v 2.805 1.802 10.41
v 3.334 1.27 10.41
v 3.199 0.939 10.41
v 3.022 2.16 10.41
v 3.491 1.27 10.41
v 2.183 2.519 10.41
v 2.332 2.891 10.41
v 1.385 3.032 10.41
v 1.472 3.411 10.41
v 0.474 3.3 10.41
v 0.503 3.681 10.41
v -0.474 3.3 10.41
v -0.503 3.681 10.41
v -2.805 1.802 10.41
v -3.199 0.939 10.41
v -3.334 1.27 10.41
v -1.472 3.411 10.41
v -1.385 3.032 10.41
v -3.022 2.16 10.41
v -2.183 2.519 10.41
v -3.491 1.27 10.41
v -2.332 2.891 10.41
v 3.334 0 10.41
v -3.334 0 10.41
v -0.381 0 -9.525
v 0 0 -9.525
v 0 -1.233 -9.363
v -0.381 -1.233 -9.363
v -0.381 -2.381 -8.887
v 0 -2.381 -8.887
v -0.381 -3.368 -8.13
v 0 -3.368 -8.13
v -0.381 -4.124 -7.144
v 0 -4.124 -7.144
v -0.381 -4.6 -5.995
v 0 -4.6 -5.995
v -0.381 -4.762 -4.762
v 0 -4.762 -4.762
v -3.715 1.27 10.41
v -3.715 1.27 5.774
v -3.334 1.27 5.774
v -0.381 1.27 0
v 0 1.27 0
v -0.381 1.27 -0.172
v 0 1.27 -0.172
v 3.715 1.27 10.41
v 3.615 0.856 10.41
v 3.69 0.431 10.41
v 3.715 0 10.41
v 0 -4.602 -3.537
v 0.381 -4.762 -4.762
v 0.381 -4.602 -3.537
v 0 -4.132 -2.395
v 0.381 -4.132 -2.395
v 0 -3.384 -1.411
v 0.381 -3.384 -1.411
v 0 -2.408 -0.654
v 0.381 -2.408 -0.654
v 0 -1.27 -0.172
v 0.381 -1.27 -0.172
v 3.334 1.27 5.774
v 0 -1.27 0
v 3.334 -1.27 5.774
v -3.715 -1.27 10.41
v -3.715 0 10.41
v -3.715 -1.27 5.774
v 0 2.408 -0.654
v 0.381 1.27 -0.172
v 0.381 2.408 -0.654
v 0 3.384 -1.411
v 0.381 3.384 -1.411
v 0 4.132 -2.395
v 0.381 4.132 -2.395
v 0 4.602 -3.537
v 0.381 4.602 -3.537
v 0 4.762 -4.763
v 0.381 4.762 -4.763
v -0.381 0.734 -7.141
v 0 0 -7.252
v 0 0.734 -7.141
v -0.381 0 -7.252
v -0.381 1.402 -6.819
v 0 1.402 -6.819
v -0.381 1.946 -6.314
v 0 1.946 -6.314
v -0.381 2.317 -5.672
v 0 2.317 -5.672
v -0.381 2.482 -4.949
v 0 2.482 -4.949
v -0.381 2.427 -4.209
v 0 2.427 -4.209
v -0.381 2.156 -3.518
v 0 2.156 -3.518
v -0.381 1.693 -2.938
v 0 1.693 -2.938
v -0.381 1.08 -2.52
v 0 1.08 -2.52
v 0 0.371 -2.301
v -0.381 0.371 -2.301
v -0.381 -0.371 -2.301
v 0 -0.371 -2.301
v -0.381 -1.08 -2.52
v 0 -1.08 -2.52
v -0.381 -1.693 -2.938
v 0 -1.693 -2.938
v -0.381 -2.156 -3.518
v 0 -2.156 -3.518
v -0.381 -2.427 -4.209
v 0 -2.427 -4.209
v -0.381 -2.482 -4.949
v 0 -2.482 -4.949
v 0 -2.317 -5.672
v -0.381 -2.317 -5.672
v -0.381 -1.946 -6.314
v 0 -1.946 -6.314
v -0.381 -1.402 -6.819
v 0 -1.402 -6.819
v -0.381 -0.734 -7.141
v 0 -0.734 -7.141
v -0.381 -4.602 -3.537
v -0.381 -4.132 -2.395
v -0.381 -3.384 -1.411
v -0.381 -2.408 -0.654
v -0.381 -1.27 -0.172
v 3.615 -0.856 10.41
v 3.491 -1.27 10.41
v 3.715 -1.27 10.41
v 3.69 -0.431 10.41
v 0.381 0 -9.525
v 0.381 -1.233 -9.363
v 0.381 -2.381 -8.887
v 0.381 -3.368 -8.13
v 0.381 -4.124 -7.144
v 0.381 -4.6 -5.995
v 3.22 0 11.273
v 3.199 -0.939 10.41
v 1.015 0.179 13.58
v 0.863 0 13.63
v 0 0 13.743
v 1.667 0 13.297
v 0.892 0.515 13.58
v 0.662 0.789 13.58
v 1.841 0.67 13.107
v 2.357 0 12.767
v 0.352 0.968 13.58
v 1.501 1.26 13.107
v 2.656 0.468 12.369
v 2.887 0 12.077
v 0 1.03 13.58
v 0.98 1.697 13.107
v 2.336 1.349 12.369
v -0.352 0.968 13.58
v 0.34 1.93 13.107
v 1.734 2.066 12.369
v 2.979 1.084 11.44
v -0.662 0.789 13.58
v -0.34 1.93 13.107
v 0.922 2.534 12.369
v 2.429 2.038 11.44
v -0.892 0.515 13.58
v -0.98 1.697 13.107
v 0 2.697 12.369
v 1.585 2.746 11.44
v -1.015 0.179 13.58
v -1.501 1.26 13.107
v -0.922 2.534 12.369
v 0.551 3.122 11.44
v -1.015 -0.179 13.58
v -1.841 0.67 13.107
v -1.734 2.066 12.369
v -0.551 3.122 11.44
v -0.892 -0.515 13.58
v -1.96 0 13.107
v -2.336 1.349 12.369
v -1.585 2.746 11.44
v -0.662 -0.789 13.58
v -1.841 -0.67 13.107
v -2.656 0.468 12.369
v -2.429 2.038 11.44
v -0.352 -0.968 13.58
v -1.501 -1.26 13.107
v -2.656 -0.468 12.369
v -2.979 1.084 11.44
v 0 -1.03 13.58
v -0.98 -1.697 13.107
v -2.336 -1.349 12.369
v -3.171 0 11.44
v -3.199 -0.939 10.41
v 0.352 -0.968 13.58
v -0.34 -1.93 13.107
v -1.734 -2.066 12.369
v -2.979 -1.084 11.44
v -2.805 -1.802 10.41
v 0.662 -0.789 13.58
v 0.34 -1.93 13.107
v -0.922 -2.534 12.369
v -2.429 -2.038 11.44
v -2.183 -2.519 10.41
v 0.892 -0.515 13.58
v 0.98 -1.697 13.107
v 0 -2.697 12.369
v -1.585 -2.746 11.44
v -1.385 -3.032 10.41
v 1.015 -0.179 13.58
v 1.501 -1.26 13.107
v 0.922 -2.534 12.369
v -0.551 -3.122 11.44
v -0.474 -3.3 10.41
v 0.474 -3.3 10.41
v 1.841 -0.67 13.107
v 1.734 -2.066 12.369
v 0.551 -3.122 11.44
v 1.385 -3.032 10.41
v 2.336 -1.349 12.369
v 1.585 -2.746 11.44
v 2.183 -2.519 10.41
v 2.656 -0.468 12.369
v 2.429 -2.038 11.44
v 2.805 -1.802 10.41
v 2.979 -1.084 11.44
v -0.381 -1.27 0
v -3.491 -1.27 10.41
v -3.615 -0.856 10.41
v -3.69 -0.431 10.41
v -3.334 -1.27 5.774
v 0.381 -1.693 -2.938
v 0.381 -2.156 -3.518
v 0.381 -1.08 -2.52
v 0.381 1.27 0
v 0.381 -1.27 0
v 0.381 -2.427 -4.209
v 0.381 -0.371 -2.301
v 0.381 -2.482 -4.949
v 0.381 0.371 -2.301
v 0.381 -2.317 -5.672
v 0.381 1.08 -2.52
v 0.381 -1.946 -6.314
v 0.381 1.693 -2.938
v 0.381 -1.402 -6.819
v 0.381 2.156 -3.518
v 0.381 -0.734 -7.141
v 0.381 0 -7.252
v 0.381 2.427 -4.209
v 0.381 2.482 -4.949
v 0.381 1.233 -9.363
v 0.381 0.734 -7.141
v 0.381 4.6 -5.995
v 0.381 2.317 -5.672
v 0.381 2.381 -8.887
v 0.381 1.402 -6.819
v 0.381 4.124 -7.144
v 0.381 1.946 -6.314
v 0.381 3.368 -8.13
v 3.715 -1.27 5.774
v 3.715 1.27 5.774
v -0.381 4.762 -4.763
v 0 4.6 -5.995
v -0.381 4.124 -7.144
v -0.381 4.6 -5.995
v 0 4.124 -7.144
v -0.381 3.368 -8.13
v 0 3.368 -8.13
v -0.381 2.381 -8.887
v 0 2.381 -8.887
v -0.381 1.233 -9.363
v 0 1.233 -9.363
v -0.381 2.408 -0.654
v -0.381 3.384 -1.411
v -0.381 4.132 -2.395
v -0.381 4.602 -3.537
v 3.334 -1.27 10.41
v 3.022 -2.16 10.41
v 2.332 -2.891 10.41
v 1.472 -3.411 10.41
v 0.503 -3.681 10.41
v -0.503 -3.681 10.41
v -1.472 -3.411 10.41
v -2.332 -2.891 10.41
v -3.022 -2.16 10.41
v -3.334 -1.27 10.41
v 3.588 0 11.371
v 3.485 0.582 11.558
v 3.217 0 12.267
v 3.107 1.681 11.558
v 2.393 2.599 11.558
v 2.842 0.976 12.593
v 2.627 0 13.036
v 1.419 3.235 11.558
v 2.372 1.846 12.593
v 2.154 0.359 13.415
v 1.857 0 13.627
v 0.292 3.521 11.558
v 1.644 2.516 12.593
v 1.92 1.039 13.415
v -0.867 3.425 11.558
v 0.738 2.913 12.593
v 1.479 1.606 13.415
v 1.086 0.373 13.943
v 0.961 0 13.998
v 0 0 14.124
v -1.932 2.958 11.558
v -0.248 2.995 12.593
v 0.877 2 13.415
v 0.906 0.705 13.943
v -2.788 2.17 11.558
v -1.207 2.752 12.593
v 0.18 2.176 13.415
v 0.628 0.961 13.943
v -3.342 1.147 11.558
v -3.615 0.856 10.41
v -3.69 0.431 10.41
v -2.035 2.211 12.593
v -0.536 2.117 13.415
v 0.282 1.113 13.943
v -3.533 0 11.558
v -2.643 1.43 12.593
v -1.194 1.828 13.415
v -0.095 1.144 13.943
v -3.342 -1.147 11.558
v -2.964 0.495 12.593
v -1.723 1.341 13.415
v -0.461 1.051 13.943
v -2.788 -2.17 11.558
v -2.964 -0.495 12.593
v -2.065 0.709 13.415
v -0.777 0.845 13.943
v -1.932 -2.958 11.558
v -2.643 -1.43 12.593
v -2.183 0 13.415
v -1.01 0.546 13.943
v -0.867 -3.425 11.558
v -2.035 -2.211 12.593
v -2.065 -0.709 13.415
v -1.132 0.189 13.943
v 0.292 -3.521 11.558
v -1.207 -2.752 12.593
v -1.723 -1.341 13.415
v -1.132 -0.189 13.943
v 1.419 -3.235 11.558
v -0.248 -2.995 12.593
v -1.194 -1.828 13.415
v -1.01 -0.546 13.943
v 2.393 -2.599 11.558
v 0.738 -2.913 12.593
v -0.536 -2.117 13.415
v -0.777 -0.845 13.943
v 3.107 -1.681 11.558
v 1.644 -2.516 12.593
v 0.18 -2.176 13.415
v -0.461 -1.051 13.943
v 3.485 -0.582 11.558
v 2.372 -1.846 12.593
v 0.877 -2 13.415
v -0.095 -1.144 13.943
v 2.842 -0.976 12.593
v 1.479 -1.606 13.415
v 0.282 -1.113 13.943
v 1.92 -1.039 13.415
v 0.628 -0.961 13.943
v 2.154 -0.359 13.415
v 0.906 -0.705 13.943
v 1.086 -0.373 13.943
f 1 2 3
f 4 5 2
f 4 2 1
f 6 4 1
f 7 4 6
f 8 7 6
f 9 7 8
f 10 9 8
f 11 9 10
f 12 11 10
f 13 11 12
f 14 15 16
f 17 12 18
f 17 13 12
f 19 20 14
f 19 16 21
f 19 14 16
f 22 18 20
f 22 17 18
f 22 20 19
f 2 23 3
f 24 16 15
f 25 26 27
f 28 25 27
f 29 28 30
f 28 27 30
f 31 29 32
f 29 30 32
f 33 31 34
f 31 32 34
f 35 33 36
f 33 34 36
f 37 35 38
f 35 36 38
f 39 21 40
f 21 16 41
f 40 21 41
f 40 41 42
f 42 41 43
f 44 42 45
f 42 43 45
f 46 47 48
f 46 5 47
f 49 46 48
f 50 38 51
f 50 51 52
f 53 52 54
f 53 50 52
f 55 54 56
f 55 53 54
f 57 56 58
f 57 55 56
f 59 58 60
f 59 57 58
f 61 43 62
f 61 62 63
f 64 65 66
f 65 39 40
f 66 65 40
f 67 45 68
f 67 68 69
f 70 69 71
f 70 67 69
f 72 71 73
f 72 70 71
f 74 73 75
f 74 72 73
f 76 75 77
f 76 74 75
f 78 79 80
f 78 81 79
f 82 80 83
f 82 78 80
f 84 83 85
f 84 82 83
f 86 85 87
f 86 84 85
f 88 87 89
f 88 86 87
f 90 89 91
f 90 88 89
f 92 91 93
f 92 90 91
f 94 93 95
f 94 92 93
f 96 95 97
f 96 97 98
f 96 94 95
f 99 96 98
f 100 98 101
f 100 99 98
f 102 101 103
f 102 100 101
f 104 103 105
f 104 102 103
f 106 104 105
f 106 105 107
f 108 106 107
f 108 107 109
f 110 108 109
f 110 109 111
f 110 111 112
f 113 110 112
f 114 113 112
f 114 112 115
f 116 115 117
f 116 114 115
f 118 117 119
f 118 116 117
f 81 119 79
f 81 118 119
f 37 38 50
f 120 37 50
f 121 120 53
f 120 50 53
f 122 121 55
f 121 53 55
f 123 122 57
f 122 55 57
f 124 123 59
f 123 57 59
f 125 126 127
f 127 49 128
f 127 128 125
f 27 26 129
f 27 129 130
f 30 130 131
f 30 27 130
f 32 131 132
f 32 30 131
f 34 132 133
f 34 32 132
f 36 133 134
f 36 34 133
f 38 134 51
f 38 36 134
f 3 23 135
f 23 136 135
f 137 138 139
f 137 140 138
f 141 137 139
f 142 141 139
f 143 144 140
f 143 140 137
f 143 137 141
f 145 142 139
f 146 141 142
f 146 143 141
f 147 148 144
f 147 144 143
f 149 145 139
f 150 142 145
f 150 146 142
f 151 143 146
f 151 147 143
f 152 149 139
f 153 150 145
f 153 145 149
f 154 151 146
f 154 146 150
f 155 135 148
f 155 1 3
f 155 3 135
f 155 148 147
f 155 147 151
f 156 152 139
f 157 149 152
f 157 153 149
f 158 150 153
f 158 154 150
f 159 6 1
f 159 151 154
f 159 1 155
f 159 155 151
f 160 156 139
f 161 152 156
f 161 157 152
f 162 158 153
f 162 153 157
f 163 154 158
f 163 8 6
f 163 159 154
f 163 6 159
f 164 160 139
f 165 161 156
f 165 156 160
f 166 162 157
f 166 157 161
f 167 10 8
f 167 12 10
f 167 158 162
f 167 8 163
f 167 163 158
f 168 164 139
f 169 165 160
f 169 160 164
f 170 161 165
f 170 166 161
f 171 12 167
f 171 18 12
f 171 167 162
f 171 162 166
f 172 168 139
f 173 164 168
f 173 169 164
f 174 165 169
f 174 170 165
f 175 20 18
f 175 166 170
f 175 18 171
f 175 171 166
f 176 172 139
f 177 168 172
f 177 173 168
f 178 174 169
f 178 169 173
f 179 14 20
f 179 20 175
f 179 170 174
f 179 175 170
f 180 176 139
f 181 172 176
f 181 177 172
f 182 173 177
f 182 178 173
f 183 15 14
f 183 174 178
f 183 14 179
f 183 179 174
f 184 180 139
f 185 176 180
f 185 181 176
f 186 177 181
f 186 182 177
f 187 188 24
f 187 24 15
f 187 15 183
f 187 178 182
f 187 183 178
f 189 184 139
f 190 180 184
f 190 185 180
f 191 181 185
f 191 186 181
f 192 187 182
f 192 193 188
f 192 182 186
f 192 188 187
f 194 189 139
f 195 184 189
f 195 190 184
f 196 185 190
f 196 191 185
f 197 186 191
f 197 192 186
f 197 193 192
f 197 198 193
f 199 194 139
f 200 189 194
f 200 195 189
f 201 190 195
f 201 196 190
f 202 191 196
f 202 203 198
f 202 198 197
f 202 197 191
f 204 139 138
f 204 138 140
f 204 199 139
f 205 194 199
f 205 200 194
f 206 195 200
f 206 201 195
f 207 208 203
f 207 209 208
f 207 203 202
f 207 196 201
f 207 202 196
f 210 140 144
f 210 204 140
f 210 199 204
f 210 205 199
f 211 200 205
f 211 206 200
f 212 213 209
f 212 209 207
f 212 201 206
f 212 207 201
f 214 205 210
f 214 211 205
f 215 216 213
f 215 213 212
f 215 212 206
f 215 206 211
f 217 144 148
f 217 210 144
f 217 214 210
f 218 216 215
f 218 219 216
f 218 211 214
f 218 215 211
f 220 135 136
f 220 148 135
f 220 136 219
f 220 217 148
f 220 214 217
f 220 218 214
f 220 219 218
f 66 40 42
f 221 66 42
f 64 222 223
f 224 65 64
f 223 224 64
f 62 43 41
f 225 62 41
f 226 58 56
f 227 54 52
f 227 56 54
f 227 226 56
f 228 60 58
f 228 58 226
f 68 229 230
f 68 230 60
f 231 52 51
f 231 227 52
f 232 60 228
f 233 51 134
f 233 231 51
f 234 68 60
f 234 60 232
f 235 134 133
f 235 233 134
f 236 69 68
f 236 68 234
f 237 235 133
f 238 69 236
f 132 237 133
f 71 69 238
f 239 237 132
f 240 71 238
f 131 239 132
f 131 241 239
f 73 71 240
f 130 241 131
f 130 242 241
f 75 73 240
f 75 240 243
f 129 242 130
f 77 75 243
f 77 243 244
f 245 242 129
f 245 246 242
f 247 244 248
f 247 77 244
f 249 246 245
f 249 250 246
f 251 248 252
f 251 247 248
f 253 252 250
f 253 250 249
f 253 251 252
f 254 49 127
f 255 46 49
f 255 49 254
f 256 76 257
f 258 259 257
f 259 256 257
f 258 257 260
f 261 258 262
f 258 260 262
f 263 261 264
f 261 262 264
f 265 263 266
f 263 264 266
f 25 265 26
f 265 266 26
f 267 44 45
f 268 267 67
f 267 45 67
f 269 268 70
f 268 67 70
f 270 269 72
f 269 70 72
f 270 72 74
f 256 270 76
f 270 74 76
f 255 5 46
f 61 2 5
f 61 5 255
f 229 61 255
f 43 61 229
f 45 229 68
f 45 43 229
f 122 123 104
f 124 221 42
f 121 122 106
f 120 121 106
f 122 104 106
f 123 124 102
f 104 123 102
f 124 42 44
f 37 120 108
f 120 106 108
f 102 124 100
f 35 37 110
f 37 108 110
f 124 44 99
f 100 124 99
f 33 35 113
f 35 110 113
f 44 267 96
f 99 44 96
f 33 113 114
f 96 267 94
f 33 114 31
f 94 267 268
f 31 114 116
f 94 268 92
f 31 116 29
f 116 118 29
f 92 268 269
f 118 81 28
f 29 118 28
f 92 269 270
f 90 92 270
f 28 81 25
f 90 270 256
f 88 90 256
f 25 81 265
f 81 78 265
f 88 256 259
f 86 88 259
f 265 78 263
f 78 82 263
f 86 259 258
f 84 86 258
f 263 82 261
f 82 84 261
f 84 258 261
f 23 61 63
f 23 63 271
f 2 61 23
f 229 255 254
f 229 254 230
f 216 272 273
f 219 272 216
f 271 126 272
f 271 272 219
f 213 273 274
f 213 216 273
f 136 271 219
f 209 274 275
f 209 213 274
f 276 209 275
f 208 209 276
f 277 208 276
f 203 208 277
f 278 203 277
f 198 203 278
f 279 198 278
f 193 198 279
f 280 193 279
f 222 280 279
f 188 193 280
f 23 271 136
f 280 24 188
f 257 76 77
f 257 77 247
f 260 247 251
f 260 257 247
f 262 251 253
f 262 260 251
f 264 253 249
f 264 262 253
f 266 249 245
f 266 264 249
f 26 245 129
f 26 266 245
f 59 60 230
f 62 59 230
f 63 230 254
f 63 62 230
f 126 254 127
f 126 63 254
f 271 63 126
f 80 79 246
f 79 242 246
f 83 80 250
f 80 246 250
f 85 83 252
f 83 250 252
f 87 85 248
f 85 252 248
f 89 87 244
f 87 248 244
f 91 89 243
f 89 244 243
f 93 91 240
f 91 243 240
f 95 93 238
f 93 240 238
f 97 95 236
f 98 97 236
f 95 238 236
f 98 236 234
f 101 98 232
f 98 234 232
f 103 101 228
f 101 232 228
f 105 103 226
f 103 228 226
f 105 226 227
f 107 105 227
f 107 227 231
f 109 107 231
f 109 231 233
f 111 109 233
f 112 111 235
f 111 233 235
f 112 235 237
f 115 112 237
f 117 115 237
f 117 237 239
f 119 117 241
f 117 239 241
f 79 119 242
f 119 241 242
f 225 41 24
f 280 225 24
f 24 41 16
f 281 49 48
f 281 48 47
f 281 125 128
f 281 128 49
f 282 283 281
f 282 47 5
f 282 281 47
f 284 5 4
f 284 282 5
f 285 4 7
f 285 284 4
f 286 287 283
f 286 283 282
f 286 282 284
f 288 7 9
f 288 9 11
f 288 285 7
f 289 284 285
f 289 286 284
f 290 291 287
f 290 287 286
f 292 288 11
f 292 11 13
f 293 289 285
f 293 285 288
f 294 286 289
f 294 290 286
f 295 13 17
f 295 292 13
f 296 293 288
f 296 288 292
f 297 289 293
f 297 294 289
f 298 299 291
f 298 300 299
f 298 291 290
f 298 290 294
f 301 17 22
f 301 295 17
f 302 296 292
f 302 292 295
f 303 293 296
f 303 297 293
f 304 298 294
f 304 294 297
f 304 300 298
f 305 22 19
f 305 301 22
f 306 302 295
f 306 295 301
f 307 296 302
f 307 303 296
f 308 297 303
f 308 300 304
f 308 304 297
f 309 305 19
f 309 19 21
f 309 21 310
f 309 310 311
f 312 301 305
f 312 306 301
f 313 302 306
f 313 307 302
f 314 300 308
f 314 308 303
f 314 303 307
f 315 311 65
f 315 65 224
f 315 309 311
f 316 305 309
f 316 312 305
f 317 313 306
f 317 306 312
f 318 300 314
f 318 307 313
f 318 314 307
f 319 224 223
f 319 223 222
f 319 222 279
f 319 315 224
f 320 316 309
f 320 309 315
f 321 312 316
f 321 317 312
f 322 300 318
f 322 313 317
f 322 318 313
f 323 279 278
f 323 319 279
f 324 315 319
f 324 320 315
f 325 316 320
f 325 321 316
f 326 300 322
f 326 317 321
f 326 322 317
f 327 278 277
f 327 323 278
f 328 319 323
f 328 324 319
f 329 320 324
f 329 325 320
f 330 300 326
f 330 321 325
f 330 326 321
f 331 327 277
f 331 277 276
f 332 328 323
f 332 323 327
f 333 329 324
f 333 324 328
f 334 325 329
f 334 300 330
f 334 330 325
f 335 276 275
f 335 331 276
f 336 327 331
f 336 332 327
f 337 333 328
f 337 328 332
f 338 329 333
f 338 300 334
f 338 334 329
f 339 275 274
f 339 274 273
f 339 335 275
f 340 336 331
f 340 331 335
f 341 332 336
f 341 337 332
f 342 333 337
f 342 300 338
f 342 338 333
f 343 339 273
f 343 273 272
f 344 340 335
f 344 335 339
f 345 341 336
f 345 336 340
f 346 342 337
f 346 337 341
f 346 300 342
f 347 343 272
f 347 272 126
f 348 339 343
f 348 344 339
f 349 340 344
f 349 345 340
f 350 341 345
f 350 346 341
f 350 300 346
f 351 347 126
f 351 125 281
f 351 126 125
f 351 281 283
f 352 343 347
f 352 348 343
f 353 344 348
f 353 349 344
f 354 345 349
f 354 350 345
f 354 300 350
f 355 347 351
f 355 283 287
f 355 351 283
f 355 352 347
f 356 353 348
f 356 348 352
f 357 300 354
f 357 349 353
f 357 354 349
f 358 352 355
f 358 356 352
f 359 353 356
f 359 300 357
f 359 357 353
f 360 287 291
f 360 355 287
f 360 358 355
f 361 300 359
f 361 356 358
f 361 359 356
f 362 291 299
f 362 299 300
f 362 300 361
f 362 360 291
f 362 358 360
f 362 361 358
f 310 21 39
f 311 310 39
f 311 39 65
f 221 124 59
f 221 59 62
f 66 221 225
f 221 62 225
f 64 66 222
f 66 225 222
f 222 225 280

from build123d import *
from build123d.topology import SkipClean

# Parameters (mm, degrees)
BOSS_EXTRUDE1_DEPTH = 4.7625
SKETCH2_R           = 2.4892
SKETCH2_W           = 10.40972438
SKETCH2_H           = 3.4925
CUT_EXTRUDE1_DEPTH  = 12.922988592


# Read off the part's stored shape, not the designer's step: Revolve2
with BuildPart() as part:
    # Sketch1 → Boss-Extrude1 (new, symmetric)
    with BuildSketch(Plane(origin=(0, 0, 0), x_dir=(1, 0, 0), z_dir=(0, 1, 0))):
        Polygon((0, 0), (3.33375, -5.77422438), (3.33375, -10.40972438), (3.71475, -10.40972438), (3.71475, -5.77422438), (0.381, 0), (0.381, 9.525), (0, 9.525), align=None)
    boss_extrude1 = extrude(amount=BOSS_EXTRUDE1_DEPTH, both=True)

    # Sketch2 → Cut-Extrude1 (cut, symmetric)
    with BuildSketch(Plane(origin=(0.381, 0, 0), x_dir=(0, 0, -1), z_dir=(1, 0, 0))):
        with BuildLine():
            Line((0.172455746, -1.27), (0, -1.27))
            Line((0, -1.27), (0, -4.7625))
            Line((0, -4.7625), (4.7625, -4.7625))
            ThreePointArc((4.7625, -4.7625), (1.878663038, -3.790104303), (0.172455746, -1.27))
        make_face()
        with BuildLine():
            ThreePointArc((9.525, 0), (8.130096045, -3.367596045), (4.7625, -4.7625))
            Line((4.7625, -4.7625), (9.525, -4.7625))
            Line((9.525, -4.7625), (9.525, 0))
        make_face()
        with BuildLine():
            ThreePointArc((4.762500002, 4.7625), (8.130096046, 3.367596045), (9.525, 0))
            Line((9.525, 0), (9.525, 4.7625))
            Line((9.525, 4.7625), (4.762500002, 4.7625))
        make_face()
        with BuildLine():
            Line((0, 4.7625), (0, 1.27))
            Line((0, 1.27), (0.172455746, 1.27))
            ThreePointArc((0.172455746, 1.27), (1.878663039, 3.790104303), (4.762500002, 4.7625))
            Line((4.762500002, 4.7625), (0, 4.7625))
        make_face()
        with Locations((4.7625, 0)):
            Circle(SKETCH2_R)
        with Locations((-5.20486219, 3.01625)):
            Rectangle(SKETCH2_W, SKETCH2_H)
        with Locations((-5.20486219, -3.01625)):
            Rectangle(SKETCH2_W, SKETCH2_H)
    cut_extrude1 = extrude(amount=CUT_EXTRUDE1_DEPTH, both=True, mode=Mode.SUBTRACT)

    # Mirror1: Boss-Extrude1, Cut-Extrude1 across plane
    with SkipClean():  # the faces are left unmerged after this step: merging them gives an invalid solid
        add(boss_extrude1.mirror(Plane(origin=(0, 0, 0), x_dir=(0, 0, 1), z_dir=(1, 0, 0))))
        add(cut_extrude1.mirror(Plane(origin=(0, 0, 0), x_dir=(0, 0, 1), z_dir=(1, 0, 0))), mode=Mode.SUBTRACT)

    # Revolve2 outline → Revolve2 (revolve)
    with SkipClean():  # the faces are left unmerged after this step: merging them gives an invalid solid
        with BuildSketch(Plane.XZ):
            with BuildLine():
                ThreePointArc((0, 13.74347438), (2.357317233, 12.76704161), (3.33375, 10.409724376))
                Line((3.33375, 10.409724376), (3.71475, 10.409724377))
                ThreePointArc((3.71475, 10.409724377), (2.626724917, 13.036449294), (0, 14.12447438))
                Line((0, 14.12447438), (0, 13.74347438))
            make_face()
        revolve(axis=Axis((0, 0, 0), (0, 0, 1)))


solid = part.part
